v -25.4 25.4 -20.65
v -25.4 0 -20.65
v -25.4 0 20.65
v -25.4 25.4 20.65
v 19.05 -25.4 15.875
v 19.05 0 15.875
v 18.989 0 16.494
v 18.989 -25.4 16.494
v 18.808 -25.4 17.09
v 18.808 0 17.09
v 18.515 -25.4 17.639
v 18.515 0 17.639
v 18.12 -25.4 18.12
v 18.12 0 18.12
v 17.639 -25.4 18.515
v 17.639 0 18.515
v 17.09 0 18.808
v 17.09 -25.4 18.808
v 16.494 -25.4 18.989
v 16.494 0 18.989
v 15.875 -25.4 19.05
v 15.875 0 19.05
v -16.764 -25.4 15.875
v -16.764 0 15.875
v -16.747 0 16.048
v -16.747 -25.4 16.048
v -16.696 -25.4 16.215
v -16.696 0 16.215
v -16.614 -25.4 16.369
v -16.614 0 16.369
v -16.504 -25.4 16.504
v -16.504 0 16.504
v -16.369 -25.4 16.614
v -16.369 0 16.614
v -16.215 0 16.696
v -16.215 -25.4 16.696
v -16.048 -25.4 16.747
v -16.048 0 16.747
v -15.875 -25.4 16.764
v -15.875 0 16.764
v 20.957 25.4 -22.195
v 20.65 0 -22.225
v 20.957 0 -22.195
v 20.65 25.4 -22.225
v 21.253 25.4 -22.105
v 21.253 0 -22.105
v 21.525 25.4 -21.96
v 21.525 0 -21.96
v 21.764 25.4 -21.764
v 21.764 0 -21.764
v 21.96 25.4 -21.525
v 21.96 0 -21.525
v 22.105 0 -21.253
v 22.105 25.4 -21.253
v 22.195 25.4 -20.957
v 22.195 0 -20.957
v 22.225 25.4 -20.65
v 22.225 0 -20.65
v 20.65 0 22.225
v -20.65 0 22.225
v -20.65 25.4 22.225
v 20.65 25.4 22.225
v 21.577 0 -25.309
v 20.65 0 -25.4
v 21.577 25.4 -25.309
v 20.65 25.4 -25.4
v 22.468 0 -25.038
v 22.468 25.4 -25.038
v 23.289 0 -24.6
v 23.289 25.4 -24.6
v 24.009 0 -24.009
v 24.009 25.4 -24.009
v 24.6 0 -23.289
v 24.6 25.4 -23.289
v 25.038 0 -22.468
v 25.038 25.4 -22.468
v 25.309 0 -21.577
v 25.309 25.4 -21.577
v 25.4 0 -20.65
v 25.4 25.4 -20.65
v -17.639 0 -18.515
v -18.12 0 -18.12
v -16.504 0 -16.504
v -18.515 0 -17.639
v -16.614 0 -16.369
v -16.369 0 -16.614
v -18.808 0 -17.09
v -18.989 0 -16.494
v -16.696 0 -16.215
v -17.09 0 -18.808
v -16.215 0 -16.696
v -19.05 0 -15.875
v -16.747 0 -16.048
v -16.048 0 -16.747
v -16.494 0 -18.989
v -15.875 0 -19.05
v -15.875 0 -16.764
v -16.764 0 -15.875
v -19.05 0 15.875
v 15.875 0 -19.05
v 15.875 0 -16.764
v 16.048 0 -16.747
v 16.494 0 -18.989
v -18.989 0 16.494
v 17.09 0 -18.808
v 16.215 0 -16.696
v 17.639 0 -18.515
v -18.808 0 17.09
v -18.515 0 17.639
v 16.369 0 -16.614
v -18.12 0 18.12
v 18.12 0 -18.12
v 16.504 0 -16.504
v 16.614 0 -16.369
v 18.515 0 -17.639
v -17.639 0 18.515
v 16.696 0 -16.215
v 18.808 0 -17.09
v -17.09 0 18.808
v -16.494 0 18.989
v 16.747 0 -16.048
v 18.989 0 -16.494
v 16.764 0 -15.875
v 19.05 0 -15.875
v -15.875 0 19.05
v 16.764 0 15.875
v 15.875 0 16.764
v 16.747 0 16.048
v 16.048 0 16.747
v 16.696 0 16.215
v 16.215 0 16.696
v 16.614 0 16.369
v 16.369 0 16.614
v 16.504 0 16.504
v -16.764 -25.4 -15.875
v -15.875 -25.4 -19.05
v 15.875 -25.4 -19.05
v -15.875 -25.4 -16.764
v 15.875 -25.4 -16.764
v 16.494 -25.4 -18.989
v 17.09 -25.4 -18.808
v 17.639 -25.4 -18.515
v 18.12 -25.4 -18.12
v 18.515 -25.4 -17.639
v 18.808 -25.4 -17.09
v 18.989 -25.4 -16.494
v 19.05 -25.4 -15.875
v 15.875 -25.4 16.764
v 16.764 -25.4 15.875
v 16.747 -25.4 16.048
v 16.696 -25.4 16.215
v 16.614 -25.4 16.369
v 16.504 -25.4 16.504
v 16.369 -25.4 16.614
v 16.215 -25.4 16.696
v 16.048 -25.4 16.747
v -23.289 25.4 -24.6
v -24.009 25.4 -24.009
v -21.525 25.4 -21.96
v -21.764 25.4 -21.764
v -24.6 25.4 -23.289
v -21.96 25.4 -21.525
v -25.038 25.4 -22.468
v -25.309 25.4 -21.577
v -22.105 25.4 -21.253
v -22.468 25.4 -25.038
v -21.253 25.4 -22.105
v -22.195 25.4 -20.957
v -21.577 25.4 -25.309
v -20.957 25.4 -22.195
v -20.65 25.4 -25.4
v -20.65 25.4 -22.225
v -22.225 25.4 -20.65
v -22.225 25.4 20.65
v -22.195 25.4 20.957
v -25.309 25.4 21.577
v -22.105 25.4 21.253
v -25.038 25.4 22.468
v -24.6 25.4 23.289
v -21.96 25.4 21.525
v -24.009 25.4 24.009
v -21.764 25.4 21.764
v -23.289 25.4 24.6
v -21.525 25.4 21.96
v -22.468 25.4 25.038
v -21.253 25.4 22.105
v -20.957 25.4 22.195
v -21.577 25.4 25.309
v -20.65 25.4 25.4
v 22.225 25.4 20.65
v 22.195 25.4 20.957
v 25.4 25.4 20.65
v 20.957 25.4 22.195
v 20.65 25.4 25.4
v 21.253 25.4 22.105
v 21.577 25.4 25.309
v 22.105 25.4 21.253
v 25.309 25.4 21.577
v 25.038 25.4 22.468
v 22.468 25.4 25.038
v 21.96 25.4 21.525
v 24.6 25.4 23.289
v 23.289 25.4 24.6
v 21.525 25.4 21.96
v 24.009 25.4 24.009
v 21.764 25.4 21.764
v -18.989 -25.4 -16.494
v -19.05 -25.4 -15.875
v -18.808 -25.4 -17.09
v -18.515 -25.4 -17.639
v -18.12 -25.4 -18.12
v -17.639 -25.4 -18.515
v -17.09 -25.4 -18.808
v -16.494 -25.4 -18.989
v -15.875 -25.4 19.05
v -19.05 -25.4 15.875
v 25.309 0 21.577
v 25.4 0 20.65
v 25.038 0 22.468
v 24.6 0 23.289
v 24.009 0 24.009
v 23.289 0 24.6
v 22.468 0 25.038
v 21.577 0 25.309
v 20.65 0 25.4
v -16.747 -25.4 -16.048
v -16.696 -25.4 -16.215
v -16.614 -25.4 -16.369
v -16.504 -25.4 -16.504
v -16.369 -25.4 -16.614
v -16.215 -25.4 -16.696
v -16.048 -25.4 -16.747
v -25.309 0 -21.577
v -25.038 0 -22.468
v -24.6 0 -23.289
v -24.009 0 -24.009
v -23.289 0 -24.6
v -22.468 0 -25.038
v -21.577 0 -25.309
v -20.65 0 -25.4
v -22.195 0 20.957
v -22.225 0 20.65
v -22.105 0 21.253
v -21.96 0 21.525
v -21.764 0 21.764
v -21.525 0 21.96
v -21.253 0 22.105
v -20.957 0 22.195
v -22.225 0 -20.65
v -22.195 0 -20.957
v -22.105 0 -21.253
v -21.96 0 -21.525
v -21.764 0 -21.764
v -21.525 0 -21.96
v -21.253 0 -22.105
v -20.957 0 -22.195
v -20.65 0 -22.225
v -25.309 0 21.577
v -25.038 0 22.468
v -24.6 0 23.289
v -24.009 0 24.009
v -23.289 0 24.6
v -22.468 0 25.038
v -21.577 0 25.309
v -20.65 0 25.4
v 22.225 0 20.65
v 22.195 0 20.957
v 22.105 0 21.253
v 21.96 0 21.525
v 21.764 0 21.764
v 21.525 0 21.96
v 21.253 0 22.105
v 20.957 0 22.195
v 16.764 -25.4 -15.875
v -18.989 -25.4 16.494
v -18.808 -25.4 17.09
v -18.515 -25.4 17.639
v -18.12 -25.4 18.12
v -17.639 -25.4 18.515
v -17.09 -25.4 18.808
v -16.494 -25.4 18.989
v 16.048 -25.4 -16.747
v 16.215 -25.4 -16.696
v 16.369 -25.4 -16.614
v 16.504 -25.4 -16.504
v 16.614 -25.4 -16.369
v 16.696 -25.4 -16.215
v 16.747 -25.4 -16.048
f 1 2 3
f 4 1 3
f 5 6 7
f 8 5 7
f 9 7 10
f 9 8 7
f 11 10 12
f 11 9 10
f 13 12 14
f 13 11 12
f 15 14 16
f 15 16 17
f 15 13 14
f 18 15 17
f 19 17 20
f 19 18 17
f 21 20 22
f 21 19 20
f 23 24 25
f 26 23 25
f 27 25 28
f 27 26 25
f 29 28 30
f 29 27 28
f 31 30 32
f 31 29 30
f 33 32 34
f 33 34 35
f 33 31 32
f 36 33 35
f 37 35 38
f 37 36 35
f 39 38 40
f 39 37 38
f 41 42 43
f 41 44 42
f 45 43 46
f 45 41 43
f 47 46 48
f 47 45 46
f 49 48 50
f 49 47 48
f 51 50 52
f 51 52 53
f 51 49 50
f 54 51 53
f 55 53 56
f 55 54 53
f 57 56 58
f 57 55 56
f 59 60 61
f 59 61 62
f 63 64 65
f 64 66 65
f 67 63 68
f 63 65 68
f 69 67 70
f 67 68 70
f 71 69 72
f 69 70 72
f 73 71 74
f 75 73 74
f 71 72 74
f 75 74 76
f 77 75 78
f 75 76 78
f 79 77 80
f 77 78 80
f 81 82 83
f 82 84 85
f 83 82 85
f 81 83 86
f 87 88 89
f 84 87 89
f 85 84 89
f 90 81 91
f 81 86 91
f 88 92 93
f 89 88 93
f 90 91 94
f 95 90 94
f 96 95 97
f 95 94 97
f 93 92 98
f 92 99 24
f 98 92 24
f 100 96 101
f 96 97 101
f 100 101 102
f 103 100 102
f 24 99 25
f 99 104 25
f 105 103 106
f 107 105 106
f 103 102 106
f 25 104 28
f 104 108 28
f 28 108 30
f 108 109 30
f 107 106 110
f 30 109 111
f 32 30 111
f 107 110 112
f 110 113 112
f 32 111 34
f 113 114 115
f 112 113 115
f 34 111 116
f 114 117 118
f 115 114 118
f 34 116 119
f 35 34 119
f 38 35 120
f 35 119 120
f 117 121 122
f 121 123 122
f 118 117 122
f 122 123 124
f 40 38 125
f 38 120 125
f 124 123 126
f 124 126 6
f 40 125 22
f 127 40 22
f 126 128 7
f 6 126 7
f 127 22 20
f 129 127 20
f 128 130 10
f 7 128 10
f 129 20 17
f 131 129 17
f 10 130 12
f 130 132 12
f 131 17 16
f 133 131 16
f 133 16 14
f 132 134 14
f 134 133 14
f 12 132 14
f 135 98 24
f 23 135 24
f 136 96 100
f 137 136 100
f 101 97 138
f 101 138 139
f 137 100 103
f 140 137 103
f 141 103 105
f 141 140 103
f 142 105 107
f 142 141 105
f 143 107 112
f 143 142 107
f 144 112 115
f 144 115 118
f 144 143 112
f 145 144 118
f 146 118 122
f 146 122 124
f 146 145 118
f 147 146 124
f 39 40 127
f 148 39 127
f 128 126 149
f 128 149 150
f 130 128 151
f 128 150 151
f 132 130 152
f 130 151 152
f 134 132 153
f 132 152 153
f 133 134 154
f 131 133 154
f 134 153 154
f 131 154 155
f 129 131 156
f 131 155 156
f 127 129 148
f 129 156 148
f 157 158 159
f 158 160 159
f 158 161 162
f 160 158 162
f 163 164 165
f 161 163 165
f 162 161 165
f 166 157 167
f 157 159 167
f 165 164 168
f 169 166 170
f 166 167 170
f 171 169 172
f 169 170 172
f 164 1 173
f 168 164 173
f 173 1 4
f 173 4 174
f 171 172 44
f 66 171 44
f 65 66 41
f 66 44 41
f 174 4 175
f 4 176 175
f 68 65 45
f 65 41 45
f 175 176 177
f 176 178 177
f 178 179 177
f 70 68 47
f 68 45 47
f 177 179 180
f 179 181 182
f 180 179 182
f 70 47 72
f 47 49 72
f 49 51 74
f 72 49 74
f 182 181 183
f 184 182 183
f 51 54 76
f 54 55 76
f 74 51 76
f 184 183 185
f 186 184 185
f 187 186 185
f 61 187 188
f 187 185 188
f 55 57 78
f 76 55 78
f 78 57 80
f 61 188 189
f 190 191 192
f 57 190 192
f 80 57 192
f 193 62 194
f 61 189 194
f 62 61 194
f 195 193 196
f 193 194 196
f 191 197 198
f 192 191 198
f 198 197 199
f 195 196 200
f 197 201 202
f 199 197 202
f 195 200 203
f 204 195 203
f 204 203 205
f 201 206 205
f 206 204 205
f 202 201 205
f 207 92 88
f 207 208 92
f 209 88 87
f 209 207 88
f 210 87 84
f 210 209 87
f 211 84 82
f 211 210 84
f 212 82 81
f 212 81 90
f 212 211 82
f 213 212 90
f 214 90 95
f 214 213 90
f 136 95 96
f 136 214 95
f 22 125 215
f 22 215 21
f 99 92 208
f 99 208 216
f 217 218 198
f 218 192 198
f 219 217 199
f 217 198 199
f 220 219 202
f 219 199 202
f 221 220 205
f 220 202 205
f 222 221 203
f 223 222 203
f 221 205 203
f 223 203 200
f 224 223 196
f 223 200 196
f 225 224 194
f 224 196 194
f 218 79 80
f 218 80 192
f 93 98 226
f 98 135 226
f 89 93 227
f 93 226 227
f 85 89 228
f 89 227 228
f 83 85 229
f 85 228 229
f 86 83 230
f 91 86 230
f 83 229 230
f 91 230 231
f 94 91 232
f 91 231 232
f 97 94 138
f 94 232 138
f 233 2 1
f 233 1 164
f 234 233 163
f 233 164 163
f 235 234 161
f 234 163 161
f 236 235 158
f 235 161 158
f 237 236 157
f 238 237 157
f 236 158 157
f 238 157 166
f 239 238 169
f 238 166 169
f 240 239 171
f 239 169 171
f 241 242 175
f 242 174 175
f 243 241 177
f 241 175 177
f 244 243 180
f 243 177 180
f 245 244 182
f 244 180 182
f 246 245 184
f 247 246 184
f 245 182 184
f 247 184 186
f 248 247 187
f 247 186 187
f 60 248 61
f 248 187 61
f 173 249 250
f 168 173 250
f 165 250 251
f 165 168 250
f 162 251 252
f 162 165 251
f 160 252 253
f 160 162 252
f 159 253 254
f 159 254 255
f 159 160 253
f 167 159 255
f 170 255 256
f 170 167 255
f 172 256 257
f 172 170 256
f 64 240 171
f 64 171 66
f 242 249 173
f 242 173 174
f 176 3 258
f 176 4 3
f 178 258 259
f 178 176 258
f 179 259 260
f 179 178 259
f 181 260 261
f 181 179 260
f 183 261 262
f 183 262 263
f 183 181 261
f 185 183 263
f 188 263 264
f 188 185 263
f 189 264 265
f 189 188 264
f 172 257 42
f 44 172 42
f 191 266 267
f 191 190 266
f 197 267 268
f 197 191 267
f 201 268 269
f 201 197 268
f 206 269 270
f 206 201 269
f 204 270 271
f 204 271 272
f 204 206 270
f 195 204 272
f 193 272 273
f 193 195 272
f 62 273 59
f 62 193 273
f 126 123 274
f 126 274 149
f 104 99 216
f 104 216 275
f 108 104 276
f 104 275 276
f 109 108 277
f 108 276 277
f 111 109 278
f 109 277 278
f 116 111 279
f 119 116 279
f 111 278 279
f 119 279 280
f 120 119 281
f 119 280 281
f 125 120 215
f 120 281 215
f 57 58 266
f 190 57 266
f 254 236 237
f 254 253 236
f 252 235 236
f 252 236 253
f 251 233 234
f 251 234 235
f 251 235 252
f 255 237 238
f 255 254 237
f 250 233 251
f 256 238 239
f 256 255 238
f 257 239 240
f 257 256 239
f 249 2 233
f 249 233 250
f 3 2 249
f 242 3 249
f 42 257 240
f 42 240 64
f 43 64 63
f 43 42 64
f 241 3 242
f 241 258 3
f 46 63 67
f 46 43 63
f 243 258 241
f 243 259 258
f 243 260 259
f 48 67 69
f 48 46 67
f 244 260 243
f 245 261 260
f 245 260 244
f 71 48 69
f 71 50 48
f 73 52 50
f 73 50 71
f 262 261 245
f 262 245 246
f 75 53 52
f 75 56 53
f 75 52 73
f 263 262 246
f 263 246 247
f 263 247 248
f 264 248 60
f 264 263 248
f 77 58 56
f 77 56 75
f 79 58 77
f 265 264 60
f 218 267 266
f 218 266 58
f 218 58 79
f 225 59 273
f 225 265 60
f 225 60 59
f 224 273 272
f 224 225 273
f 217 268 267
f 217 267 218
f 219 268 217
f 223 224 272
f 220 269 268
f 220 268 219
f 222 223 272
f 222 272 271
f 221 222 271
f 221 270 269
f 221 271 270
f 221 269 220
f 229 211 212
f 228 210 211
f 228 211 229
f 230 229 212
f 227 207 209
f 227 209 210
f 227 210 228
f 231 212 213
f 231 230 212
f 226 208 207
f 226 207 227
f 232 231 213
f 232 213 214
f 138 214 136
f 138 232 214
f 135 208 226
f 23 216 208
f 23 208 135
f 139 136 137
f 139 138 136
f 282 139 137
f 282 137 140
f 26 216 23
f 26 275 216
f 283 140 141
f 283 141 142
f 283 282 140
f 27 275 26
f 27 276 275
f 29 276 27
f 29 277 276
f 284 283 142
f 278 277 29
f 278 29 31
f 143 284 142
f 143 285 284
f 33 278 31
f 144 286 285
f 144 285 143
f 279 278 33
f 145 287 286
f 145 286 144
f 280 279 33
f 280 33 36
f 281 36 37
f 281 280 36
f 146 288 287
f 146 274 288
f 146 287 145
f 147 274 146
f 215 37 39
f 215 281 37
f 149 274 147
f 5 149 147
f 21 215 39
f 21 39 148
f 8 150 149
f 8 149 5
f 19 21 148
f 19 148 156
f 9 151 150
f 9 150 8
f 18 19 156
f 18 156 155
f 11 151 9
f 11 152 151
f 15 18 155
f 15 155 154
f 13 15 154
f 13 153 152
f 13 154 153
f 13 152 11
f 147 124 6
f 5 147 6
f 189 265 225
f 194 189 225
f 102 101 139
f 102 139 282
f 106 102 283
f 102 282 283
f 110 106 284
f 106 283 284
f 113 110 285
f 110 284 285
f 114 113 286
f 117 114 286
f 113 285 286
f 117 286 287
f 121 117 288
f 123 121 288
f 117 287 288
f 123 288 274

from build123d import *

# Parameters (mm, degrees)
F0_W     = 50.8
F0_H     = 50.8
F1_DEPTH = 25.4
F2_R     = 4.7498
F3_T     = -3.175
F4_W     = 38.1
F4_H     = 38.1
F5_DEPTH = 25.4
F6_R     = 3.175
F7_T     = -2.286


with BuildPart() as f1:
    # F0 (on Front) → F1 (new body)
    with BuildSketch(Plane.XZ):
        Rectangle(F0_W, F0_H)
    extrude(amount=-F1_DEPTH)

    # F2
    f2_edges = [f1.edges().sort_by_distance(p)[0] for p in [
        (-25.4, 12.7, 25.4),
        (25.4, 12.7, 25.4),
        (25.4, 12.7, -25.4),
        (-25.4, 12.7, -25.4),
    ]]
    fillet(f2_edges, radius=F2_R)

    # F3
    f3_openings = [f1.faces().sort_by_distance(p)[0] for p in [
        (0, 25.4, 0),
        (0, 0, 0),
    ]]
    offset(amount=F3_T, openings=f3_openings)


with BuildPart() as f5:
    # F4 (on Front) → F5 (new body)
    with BuildSketch(Plane.XZ):
        Rectangle(F4_W, F4_H)
    extrude(amount=F5_DEPTH)

    # F6
    f6_edges = [f5.edges().sort_by_distance(p)[0] for p in [
        (-19.05, -12.7, 19.05),
        (19.05, -12.7, 19.05),
        (19.05, -12.7, -19.05),
        (-19.05, -12.7, -19.05),
    ]]
    fillet(f6_edges, radius=F6_R)

    # F7
    f7_openings = [f5.faces().sort_by_distance(p)[0] for p in [
        (0, -25.4, 0),
        (0, 0, 0),
    ]]
    offset(amount=F7_T, openings=f7_openings)


solid = Compound([f1.part, f5.part])
